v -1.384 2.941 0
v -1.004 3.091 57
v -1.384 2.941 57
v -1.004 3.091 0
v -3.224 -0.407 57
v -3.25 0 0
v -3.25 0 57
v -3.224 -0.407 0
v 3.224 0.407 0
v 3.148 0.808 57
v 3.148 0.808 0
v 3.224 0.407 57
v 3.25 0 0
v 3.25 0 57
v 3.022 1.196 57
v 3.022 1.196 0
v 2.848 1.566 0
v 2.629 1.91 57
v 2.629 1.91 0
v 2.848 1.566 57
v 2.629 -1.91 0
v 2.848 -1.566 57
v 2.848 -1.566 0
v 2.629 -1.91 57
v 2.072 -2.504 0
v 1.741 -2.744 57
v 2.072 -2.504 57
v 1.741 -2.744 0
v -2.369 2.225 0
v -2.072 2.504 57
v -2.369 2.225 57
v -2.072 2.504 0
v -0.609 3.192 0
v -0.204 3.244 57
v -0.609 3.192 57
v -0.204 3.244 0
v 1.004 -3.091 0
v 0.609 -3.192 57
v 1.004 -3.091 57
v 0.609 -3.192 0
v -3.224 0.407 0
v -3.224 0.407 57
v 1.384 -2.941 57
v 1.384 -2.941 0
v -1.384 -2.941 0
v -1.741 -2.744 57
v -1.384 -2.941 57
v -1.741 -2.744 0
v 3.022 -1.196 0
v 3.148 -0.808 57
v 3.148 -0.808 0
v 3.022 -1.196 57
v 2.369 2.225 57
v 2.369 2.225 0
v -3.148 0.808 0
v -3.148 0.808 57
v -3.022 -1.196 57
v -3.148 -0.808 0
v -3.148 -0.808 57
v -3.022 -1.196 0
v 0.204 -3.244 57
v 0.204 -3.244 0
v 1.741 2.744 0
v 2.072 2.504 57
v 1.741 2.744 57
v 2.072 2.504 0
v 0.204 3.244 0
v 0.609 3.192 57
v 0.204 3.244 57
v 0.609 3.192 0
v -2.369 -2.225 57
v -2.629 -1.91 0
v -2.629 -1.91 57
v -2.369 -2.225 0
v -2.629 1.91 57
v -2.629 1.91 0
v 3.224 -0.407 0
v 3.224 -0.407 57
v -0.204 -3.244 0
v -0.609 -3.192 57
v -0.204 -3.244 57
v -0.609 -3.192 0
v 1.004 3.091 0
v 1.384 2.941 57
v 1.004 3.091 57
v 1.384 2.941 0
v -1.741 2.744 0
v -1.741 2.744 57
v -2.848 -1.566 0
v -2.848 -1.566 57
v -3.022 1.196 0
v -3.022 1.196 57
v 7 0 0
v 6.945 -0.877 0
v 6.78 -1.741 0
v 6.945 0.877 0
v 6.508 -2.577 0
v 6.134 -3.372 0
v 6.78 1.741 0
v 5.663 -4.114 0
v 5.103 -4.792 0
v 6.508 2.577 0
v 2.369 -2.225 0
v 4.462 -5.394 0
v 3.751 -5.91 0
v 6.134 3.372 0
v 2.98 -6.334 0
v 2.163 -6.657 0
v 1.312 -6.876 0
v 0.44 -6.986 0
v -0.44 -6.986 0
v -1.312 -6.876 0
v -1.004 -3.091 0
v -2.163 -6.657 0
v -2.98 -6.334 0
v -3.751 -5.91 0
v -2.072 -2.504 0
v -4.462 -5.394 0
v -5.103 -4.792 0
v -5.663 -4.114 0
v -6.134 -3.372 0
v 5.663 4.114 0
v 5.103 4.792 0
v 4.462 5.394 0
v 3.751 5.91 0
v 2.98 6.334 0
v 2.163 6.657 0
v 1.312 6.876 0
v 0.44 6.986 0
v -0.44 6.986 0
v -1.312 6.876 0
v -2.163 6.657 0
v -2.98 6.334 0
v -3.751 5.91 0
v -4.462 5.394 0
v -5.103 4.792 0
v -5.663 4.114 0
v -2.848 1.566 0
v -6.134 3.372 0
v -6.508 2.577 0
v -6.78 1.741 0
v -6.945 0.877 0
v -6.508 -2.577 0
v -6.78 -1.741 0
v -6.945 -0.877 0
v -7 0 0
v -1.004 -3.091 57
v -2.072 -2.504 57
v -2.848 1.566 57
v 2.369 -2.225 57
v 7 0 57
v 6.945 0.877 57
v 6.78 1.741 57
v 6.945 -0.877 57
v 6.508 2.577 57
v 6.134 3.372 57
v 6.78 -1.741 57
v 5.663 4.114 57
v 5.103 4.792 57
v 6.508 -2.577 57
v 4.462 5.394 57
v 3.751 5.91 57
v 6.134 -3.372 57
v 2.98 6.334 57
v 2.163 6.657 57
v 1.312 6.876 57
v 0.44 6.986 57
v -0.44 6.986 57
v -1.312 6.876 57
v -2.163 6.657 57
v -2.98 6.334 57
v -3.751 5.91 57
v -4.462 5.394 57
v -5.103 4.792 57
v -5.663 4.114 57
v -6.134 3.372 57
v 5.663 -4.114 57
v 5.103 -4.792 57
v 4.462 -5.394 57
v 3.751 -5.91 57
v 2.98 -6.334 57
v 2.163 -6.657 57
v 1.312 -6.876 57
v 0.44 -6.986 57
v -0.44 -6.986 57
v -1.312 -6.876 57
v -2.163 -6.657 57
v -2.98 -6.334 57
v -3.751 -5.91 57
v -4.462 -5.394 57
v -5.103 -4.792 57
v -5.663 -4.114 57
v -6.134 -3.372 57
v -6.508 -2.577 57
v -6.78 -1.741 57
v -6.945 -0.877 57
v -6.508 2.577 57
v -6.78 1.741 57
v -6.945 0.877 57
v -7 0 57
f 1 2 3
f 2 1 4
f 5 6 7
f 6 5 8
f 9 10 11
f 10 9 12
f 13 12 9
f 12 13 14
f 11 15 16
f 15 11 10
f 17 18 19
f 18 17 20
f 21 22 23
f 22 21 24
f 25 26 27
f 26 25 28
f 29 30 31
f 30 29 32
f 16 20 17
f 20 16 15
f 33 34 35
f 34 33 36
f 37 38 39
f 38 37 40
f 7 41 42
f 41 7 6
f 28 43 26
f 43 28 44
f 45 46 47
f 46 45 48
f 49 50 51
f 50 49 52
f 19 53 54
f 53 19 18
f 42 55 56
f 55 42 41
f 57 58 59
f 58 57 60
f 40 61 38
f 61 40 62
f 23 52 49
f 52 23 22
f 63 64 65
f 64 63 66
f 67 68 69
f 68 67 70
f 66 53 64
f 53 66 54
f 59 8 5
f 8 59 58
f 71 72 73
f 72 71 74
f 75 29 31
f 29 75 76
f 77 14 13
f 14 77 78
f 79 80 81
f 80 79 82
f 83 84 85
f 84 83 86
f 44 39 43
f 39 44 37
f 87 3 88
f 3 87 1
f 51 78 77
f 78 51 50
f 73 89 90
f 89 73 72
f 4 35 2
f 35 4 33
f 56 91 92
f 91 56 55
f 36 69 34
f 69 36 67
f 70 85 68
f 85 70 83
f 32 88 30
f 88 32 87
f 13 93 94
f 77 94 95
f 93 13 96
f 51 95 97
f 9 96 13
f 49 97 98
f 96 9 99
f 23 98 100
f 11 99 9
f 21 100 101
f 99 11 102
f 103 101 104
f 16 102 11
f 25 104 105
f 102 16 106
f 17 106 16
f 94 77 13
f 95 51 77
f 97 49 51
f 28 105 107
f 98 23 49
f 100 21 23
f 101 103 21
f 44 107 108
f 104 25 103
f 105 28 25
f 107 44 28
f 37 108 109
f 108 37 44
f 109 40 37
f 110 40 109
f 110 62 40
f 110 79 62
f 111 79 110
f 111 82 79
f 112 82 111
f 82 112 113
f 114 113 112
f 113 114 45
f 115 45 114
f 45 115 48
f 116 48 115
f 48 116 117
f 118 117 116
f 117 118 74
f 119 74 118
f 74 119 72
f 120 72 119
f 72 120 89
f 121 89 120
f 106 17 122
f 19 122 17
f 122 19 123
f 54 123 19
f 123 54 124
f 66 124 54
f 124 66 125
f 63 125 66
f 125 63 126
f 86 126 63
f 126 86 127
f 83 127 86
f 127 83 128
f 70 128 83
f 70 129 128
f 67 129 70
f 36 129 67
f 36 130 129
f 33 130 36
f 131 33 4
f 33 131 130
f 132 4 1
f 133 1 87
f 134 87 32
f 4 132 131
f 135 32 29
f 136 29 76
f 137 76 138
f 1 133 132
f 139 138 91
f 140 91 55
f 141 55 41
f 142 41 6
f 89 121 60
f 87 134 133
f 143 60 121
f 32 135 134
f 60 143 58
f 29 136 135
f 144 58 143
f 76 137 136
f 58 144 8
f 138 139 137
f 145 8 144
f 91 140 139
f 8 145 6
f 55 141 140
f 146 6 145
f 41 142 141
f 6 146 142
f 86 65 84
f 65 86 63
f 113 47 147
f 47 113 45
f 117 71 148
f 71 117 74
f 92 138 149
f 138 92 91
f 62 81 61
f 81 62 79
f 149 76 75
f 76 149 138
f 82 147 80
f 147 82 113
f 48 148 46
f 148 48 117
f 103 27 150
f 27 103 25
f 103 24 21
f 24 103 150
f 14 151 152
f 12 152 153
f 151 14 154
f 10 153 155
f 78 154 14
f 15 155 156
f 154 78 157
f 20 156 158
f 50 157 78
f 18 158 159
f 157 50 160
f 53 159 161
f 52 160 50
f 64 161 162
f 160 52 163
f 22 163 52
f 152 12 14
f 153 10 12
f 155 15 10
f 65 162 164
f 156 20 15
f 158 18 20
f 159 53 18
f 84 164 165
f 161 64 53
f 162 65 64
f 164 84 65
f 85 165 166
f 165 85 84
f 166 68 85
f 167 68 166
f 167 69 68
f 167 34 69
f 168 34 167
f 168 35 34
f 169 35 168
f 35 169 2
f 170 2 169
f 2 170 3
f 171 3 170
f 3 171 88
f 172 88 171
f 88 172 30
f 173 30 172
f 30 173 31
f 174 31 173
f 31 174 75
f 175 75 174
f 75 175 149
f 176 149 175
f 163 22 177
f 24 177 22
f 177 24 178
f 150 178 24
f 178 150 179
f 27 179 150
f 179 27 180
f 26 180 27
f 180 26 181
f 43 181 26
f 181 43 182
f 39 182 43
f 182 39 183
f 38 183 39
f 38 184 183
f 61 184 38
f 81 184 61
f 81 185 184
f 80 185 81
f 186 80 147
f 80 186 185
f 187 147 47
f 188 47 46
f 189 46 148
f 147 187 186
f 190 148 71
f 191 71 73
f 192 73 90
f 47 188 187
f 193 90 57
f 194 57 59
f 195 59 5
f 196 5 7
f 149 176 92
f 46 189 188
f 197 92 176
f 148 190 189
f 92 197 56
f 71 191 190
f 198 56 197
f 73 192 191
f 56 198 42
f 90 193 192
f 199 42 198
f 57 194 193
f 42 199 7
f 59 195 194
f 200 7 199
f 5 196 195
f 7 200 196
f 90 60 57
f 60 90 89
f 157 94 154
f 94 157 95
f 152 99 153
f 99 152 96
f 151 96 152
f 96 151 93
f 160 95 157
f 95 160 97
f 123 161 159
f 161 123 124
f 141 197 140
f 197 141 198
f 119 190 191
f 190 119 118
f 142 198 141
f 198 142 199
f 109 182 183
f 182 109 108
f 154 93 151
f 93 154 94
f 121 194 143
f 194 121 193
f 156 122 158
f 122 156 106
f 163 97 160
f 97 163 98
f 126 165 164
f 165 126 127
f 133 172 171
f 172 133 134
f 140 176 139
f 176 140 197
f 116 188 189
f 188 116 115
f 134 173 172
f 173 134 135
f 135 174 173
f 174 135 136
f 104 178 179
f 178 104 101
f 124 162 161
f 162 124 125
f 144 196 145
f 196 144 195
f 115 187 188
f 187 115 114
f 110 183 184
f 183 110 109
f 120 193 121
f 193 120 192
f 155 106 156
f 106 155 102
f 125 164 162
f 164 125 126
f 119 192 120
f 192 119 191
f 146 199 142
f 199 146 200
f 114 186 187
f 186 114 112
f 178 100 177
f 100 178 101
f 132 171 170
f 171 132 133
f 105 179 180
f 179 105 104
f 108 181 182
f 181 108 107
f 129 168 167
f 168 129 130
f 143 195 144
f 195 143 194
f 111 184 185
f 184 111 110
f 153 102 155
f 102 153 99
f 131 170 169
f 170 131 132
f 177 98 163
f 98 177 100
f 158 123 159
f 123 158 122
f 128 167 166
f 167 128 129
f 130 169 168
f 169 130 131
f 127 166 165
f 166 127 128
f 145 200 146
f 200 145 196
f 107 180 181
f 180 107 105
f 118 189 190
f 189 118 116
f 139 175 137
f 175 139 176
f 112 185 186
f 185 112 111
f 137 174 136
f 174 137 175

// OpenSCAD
$fn = 50;


difference() {
	union() {
		cylinder(h = 57, r = 7.0000000000);
	}
	union() {
		cylinder(h = 57, r = 3.2500000000);
		cylinder(h = 57, r = 1.8000000000);
		cylinder(h = 57, r = 1.8000000000);
		cylinder(h = 57, r = 1.8000000000);
	}
}
